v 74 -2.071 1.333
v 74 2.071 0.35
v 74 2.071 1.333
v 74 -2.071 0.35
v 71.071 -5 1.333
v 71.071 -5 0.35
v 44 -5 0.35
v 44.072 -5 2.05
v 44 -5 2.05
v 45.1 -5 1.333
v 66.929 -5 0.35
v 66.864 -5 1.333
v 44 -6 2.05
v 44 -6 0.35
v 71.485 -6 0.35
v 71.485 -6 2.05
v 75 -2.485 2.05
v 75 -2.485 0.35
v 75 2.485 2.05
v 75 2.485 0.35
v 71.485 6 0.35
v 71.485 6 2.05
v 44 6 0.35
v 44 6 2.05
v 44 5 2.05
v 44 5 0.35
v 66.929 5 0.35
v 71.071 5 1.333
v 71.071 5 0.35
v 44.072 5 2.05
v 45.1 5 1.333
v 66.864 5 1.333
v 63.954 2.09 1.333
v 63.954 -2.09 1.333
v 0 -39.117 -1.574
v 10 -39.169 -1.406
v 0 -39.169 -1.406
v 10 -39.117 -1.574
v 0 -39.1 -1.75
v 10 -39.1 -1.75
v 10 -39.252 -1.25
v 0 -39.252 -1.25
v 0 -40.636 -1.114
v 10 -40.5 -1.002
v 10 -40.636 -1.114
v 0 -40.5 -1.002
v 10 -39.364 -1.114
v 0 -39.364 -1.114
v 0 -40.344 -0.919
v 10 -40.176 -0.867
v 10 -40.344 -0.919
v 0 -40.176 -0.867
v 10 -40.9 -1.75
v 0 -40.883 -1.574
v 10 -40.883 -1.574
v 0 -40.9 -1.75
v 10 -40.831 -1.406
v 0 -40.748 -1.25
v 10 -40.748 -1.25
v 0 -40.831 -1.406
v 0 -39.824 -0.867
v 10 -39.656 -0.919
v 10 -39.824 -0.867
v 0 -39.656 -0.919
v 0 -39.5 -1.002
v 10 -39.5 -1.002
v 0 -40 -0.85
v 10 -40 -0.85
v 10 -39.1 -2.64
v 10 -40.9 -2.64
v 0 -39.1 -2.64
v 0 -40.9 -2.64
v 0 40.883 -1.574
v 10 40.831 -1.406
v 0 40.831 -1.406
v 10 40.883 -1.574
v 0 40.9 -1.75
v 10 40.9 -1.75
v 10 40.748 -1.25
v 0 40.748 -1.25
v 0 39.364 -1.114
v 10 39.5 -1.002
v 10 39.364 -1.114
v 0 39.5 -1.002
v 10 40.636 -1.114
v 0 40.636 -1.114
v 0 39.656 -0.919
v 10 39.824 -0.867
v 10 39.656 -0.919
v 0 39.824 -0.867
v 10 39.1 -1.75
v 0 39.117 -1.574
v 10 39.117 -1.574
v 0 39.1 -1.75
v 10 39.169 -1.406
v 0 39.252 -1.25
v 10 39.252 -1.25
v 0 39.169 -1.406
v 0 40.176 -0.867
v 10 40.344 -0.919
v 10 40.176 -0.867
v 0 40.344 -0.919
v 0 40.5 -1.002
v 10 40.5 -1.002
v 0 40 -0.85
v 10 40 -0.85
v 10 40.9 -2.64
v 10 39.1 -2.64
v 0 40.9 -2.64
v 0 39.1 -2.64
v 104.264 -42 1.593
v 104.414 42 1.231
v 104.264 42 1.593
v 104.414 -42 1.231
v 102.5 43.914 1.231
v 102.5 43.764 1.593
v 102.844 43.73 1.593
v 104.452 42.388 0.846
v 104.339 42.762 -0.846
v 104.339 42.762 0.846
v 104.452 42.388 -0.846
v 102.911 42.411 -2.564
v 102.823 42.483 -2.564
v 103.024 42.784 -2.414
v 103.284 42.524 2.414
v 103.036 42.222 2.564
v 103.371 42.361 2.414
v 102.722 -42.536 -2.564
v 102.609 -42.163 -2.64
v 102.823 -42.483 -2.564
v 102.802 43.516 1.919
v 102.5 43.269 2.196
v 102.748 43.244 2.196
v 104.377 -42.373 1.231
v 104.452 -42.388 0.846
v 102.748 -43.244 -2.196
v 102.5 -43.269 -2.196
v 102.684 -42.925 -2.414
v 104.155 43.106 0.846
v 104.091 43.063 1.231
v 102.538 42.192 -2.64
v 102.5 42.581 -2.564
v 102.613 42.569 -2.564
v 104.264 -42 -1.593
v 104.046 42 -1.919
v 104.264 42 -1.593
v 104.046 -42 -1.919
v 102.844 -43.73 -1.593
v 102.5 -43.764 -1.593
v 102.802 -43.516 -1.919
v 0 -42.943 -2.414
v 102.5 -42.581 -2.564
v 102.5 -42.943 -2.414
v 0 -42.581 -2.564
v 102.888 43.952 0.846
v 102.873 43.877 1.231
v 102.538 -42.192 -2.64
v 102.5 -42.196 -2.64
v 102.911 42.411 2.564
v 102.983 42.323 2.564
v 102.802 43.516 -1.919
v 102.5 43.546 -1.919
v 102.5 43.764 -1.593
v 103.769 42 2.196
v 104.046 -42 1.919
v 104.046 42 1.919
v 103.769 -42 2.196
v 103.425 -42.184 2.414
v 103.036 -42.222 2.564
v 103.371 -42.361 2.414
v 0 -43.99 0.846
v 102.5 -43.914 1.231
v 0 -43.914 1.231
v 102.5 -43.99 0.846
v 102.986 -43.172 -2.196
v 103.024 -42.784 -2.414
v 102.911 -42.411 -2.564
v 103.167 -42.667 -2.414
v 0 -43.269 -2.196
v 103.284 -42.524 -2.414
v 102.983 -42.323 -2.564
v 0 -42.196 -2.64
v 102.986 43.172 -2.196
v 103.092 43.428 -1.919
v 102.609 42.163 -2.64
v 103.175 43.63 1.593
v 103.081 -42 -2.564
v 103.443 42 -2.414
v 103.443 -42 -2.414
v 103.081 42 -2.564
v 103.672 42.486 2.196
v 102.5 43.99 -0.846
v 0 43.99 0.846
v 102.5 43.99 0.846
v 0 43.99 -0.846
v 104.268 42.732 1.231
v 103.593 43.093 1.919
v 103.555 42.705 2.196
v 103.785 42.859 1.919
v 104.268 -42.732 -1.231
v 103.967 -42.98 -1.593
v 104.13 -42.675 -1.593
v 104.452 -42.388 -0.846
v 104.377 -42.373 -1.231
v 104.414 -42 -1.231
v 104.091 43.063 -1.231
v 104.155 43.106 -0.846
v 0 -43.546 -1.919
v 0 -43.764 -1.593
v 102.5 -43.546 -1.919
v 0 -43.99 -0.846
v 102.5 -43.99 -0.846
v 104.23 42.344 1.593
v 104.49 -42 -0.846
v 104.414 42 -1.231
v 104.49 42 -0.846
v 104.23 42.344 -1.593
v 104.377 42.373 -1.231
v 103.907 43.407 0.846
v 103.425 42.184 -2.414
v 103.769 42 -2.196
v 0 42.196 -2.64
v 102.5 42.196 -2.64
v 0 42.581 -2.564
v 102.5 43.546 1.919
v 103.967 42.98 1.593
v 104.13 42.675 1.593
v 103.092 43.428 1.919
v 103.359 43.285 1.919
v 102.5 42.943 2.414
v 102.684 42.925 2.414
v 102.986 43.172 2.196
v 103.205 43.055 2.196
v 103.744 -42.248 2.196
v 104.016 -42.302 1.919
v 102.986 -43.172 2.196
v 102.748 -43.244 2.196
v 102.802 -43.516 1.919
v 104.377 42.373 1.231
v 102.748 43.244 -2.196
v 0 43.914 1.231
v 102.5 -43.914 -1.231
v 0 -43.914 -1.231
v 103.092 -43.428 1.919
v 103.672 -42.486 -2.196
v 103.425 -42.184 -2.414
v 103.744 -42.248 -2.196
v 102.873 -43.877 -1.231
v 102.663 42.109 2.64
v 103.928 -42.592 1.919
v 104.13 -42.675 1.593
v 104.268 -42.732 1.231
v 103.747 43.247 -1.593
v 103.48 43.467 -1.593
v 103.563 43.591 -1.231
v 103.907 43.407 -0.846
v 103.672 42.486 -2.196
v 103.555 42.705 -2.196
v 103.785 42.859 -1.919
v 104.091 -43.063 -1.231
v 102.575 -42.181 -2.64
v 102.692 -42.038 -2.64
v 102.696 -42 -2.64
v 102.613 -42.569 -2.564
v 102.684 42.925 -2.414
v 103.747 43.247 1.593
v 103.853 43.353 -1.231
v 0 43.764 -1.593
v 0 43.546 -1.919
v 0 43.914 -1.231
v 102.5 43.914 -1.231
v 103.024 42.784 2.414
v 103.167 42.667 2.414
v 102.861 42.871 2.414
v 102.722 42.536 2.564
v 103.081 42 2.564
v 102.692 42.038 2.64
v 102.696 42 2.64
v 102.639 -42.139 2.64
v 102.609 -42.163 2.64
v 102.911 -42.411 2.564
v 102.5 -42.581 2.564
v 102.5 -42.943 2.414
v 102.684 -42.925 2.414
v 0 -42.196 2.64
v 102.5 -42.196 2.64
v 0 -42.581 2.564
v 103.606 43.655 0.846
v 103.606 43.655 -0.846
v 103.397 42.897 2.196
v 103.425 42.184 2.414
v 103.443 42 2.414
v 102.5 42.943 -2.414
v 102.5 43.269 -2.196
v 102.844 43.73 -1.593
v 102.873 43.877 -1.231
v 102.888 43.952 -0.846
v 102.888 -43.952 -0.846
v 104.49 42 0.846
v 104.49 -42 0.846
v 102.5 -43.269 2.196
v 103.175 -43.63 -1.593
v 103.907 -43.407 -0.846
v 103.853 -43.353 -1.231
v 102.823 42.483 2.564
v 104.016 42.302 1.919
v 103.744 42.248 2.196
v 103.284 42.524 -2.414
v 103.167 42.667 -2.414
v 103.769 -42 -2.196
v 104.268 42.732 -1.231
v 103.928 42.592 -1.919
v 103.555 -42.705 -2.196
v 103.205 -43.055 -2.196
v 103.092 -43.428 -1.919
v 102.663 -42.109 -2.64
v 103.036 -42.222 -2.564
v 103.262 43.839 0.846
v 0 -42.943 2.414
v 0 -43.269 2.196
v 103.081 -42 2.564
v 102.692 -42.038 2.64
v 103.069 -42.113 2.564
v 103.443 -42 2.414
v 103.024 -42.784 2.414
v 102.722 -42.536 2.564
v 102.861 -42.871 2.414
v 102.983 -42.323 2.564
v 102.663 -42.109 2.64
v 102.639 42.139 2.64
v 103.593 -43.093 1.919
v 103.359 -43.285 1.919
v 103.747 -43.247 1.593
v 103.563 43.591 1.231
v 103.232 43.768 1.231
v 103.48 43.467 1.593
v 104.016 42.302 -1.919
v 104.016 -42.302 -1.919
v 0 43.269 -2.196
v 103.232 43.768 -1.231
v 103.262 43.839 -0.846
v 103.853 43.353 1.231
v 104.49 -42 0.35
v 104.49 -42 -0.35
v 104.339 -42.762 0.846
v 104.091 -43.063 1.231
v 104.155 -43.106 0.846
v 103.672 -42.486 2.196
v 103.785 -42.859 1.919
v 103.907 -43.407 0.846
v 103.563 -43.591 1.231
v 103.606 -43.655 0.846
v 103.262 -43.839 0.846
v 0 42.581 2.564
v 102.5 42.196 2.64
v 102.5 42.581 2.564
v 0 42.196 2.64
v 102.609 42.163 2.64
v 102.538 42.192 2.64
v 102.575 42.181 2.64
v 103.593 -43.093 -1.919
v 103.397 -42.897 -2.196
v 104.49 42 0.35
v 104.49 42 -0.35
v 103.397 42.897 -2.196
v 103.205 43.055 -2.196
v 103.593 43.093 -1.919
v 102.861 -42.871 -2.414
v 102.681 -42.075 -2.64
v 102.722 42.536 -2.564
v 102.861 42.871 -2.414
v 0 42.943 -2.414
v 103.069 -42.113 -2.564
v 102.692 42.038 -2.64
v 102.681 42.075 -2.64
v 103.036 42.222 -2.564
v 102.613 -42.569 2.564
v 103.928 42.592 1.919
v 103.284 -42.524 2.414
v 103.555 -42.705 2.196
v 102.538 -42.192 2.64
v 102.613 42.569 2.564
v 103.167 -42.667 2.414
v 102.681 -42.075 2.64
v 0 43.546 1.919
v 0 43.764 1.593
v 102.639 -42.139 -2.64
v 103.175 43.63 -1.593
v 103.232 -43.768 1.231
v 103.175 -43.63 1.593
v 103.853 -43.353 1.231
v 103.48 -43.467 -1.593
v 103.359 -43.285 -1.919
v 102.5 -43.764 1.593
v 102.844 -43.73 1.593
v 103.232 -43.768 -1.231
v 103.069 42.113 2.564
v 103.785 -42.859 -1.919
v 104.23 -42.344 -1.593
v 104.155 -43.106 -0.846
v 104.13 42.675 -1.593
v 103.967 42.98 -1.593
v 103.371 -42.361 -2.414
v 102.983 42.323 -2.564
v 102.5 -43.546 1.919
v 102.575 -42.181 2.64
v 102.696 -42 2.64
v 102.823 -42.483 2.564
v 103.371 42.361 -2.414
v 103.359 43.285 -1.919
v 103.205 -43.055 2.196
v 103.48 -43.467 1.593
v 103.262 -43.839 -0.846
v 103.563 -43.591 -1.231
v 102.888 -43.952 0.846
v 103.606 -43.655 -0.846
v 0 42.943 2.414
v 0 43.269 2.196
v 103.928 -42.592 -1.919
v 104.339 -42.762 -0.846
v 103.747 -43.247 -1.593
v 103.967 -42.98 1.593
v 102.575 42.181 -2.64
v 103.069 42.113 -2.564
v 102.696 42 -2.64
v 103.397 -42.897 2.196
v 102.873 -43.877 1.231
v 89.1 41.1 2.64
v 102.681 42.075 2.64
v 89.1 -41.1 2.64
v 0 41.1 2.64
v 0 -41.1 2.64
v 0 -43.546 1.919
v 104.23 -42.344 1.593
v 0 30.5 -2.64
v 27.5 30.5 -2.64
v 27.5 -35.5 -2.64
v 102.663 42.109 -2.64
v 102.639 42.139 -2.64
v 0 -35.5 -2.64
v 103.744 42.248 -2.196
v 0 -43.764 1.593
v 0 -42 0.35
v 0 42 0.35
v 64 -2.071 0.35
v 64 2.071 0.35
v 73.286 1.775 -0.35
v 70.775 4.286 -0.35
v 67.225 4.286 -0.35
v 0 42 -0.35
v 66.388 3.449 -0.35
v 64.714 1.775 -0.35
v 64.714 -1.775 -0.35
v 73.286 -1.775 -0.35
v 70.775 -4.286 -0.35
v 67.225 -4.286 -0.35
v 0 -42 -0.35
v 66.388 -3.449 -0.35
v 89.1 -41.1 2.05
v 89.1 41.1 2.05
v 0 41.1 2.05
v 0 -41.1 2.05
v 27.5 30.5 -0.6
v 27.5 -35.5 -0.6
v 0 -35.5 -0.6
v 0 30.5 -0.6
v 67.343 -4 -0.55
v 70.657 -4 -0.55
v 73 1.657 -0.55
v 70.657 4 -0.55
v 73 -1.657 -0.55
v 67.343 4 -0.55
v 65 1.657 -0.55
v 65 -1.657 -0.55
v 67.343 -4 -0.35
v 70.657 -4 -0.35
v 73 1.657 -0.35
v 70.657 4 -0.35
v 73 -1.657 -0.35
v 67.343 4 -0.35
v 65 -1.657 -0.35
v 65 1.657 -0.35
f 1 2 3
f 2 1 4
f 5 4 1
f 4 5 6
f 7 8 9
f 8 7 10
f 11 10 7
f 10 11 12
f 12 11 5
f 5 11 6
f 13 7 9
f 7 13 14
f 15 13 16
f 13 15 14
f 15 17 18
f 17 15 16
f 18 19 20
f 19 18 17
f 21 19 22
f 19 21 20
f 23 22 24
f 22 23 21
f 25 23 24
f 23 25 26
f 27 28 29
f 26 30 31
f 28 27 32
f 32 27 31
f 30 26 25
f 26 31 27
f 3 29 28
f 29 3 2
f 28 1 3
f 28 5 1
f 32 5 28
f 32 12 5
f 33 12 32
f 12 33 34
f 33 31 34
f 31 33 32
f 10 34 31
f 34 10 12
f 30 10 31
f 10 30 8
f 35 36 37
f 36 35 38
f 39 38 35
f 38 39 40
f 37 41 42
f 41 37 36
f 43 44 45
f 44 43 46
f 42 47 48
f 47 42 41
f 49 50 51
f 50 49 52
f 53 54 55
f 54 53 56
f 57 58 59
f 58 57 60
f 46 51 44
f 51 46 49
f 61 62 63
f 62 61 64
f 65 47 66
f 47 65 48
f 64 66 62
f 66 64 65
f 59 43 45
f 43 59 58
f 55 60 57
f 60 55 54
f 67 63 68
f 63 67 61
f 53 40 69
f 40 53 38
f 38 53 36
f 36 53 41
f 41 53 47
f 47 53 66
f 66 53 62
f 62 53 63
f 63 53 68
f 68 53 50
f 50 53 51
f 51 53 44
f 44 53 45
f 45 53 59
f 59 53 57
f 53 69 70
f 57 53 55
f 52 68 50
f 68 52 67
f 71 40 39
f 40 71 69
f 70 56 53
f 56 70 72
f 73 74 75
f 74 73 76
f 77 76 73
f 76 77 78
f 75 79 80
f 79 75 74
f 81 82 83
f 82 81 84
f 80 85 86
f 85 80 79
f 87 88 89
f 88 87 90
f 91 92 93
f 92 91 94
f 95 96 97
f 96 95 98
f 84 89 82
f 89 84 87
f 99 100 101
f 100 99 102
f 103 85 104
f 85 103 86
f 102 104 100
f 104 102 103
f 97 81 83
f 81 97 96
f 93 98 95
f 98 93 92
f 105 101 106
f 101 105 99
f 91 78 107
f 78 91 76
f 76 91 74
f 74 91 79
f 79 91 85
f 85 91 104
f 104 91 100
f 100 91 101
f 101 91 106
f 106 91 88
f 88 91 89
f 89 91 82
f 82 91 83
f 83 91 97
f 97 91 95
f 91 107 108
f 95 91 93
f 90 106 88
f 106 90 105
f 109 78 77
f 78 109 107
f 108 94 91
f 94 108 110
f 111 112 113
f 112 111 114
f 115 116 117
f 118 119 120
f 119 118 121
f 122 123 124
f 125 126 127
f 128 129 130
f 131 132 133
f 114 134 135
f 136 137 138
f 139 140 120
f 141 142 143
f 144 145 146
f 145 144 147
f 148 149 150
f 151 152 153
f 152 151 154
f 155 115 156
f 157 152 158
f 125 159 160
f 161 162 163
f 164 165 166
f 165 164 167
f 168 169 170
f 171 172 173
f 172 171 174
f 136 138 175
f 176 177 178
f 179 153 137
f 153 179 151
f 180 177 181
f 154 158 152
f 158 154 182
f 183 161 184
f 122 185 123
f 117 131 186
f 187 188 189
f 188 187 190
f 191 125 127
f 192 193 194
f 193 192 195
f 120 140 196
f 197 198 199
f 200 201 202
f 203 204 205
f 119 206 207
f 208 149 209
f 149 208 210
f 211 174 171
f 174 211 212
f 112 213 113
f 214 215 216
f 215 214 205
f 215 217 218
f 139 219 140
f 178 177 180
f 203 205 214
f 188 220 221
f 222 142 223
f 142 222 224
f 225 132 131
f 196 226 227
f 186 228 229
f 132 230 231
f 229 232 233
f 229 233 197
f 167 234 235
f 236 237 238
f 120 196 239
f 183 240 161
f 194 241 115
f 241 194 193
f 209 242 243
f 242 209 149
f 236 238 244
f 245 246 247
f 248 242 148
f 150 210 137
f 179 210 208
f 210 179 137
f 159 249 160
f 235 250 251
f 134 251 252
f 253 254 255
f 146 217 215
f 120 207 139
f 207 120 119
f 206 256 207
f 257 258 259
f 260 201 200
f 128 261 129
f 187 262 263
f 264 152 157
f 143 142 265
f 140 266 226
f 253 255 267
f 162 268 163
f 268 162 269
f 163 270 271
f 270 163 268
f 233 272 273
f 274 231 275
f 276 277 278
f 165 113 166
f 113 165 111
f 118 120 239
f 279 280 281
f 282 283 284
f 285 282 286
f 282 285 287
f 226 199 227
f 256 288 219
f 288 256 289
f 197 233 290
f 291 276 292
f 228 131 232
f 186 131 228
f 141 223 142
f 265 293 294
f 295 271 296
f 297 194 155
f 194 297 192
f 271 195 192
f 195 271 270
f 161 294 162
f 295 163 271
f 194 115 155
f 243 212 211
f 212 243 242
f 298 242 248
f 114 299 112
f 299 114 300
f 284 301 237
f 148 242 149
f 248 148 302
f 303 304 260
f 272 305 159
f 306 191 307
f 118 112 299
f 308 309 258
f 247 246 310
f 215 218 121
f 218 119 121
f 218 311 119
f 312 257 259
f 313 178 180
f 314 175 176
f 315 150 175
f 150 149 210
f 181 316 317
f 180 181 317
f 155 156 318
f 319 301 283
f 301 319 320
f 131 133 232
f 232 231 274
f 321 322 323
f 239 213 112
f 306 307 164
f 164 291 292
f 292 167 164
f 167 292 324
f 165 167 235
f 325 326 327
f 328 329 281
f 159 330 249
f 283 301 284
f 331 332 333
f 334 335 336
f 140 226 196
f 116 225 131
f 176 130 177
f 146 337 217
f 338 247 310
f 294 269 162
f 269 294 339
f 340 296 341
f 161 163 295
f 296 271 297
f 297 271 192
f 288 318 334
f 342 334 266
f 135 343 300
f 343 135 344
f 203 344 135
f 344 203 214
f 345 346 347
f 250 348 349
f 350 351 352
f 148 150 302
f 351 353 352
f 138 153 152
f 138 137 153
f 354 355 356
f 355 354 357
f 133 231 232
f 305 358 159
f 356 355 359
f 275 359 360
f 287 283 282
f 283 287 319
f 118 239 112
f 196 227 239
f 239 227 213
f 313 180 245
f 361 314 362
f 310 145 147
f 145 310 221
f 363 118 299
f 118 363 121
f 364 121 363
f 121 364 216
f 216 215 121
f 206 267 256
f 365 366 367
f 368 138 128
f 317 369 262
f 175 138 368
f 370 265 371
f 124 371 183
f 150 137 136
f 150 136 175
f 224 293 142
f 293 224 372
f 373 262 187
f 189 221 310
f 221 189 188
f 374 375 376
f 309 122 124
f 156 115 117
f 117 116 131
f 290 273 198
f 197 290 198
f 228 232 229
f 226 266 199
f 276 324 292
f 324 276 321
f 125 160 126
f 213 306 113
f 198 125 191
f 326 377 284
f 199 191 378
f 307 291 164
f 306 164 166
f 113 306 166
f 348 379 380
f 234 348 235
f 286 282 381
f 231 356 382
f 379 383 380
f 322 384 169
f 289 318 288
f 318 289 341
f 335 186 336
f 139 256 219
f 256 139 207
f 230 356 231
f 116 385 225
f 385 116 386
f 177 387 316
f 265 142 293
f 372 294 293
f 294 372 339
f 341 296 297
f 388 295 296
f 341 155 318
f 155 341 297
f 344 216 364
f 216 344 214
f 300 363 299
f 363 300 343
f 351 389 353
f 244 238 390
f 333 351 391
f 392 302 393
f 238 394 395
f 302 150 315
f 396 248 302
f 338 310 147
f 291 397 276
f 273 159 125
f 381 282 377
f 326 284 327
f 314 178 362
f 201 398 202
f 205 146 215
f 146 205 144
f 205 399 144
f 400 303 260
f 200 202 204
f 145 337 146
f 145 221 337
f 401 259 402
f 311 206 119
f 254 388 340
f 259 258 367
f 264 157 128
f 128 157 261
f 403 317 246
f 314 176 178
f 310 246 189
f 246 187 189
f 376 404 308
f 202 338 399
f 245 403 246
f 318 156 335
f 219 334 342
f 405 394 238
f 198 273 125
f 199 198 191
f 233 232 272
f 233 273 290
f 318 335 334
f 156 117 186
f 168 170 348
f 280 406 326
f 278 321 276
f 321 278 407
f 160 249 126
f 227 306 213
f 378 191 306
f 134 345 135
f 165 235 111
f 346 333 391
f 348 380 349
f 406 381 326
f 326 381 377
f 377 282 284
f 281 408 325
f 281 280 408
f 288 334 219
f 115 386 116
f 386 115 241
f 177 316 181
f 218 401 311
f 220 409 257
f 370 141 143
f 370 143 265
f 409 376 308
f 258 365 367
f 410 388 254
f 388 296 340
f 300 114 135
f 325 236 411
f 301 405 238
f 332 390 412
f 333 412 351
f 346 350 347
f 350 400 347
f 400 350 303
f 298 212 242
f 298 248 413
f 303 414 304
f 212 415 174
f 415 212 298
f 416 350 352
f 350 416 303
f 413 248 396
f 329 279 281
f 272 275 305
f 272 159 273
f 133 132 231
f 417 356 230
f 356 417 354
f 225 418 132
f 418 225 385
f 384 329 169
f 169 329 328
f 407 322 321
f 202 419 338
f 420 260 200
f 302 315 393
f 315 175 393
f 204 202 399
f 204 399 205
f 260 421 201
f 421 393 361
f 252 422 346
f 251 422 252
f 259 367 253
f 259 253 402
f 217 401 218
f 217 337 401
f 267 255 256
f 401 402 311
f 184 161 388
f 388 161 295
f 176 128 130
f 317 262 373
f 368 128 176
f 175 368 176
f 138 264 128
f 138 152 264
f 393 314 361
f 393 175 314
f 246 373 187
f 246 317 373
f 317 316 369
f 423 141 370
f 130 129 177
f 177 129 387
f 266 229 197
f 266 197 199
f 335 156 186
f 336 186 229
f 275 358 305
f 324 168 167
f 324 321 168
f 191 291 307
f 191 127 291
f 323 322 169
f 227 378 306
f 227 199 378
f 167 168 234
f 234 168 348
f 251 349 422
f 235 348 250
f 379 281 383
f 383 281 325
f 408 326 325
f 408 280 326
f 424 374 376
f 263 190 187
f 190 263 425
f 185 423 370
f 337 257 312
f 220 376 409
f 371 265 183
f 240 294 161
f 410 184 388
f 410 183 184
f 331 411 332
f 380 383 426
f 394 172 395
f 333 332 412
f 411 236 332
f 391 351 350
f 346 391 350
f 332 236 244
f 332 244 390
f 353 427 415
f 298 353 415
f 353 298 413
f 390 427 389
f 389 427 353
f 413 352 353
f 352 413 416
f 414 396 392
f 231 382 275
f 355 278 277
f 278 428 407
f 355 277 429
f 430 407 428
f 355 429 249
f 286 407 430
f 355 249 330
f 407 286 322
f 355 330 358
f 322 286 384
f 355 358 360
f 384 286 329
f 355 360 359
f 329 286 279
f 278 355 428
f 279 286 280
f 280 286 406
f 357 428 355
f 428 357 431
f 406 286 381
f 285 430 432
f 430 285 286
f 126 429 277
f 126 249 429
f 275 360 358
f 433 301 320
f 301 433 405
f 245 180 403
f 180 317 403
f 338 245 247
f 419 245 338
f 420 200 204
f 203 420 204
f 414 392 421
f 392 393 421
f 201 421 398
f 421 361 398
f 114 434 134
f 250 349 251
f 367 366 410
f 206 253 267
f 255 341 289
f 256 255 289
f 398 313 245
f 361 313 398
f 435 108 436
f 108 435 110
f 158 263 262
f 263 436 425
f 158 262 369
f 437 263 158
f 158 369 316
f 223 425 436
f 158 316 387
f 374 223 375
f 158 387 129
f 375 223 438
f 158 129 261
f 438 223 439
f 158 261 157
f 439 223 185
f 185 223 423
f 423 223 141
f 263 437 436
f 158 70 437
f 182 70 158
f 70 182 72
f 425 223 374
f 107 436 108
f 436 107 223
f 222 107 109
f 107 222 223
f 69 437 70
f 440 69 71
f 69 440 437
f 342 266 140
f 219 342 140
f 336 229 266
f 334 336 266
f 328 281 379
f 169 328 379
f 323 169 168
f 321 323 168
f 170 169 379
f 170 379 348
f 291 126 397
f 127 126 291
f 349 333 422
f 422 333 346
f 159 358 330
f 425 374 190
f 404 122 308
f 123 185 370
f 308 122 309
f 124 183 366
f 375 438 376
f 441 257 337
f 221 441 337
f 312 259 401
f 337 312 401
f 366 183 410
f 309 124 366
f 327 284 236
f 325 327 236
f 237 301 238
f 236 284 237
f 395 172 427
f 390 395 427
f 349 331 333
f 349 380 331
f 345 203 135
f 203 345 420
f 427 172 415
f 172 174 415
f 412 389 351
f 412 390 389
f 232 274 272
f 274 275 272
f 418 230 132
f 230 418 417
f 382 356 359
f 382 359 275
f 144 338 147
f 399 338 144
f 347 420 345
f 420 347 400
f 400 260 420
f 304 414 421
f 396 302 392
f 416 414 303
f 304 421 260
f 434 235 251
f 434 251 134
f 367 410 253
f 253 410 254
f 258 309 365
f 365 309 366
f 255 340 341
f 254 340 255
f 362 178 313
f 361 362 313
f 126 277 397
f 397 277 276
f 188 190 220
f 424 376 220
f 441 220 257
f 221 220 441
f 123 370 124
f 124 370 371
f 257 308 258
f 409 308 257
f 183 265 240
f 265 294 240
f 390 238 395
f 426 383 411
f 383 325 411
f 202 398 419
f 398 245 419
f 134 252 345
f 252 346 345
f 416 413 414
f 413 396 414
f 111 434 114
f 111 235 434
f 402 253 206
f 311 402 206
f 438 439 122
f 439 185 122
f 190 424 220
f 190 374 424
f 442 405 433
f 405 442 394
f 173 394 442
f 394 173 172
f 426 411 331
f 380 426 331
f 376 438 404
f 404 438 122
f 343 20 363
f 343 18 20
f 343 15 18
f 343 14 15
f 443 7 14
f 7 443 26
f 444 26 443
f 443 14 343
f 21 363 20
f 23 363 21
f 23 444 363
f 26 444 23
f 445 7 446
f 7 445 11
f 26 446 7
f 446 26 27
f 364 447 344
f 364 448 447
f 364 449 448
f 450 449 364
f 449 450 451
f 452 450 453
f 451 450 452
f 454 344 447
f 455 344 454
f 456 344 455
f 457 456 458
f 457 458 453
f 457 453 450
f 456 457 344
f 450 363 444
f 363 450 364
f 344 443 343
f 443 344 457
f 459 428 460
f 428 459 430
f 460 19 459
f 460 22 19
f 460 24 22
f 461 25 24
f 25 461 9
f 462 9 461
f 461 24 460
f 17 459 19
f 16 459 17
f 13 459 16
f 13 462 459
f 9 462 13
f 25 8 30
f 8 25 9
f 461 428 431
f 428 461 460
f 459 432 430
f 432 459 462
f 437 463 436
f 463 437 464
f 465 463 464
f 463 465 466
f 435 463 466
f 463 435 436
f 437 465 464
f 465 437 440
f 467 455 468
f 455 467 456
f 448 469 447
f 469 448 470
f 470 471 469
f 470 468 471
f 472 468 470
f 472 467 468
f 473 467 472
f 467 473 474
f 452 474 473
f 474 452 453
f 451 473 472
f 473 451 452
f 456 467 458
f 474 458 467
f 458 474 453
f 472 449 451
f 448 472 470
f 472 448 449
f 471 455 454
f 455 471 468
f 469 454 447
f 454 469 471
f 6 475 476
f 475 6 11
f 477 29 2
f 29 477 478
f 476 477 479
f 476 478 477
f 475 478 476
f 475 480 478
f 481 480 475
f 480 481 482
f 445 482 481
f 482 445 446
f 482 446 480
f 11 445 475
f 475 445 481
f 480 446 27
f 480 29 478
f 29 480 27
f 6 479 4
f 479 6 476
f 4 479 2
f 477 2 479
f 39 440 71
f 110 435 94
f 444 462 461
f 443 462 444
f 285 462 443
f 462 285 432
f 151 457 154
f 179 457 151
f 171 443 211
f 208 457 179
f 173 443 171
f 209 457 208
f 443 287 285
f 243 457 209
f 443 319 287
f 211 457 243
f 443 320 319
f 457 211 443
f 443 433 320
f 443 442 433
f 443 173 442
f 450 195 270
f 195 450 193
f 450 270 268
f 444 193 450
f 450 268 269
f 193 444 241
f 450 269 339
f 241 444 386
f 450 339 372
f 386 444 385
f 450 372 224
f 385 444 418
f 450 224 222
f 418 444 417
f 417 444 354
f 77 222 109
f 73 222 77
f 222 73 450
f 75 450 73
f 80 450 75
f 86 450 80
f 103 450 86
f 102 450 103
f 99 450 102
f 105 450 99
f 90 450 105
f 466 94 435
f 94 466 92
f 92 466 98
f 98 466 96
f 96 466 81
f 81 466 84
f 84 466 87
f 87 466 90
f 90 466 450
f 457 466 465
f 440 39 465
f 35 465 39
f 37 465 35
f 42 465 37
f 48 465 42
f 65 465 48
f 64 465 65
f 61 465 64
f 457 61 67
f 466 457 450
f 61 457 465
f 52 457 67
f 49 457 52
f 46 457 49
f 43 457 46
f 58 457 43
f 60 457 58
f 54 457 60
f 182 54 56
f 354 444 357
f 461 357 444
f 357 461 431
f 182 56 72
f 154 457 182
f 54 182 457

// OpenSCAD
/* a sleeve for event tickets */
$fn=32;

/* [Dimensions] */
ticketCompDims=[207,84,0.7];
minWallThck=2;
recessDims=[178,82,0.6];
crnrRad=2;
spcng=0.1;

/* [Reveal Window] */
wndwDims=[75,66];
wndwPos=[-(-205/2+75+75/2),-2.5];
wndwRad=2;

/* [Options] */
split=true;

/* [Hidden] */
fudge=0.1;
ovDims=ticketCompDims+[minWallThck*1,minWallThck*2,minWallThck*2+recessDims.z];


difference(){
  body();
  translate([-(ovDims.x/2+fudge)/2,0,0]) cube([ovDims.x/2+fudge,ovDims.y+fudge,ovDims.z+fudge],true);
}

module body(){
  difference(){
    //body
    translate([0,0,0]) hull() for (ix=[-1,1],iy=[-1,1],iz=[-1,1])
      translate([ix*(ovDims.x/2-crnrRad),iy*(ovDims.y/2-crnrRad),iz*(ovDims.z/2-crnrRad)]) sphere(crnrRad);
    //ticket compartment
    translate([(minWallThck+fudge)/2,0,0]) cube(ticketCompDims+[fudge,0,0],true);
    //recess
    translate([0,0,(ovDims.z-recessDims.z+fudge)/2]) cube(recessDims+[spcng*2,spcng*2,fudge],true);
    //window
    translate([wndwPos.x,wndwPos.y,-(ovDims.z-minWallThck)/2]) cube([wndwDims.x,wndwDims.y,minWallThck+fudge],true);
    //spring
    translate([ticketCompDims.x/3,0,ovDims.z/2-recessDims.z-minWallThck-fudge/2])
      spring();;
    translate([ticketCompDims.x/3,0,ticketCompDims.z/2-spcng*2]) spring(cut=false);
    //glue channelCustomizable
    for (iy=[-1,1])
      translate([0,iy*(ovDims.y/2-crnrRad*2),-ovDims.z/2+1.8/2]){
        rotate([90,0,90]) cylinder(d=1.8,h=20,center=true);
        translate([0,0,-1.8/2]) cube([20,1.8,1.8],true);
      }
  }

  translate([ticketCompDims.x/3,0,ticketCompDims.z/2]) spring(cut=false);
}

*spring(cut=false);
module spring(size=[30,10],wdth=1,cut=true){
  R=size.y/cos(180/8);
  if (cut){
    linear_extrude(minWallThck+fudge) difference(){
      union(){
        rotate(360/16) offset(delta=wdth) circle(d=R,$fn=8);
        translate([-(size.x-size.y/2)/2,0]) square([size.x-size.y/2,size.y+wdth*2],true);
      }
      rotate(360/16) circle(d=R,$fn=8);
      translate([-(size.x-size.y/2+fudge)/2,0]) square([size.x-size.y/2+fudge,size.y],true);
    }
    translate([0,0,minWallThck*2/3]) linear_extrude(minWallThck/2+fudge) rotate(360/16) circle(d=R+fudge,$fn=8);
    translate([-size.x+size.y/2,0,minWallThck]) rotate([90,0,0]) linear_extrude(size.y+fudge,center=true) 
      polygon([[0,fudge],[size.x-size.y/2,fudge],[size.x-size.y/2,-minWallThck/3],[minWallThck/2+fudge,-minWallThck/3]]);
  }
  else
      mirror([0,0,1]) linear_extrude(ticketCompDims.z,scale=0.8) rotate(360/16) circle(d=R,$fn=8);
}
